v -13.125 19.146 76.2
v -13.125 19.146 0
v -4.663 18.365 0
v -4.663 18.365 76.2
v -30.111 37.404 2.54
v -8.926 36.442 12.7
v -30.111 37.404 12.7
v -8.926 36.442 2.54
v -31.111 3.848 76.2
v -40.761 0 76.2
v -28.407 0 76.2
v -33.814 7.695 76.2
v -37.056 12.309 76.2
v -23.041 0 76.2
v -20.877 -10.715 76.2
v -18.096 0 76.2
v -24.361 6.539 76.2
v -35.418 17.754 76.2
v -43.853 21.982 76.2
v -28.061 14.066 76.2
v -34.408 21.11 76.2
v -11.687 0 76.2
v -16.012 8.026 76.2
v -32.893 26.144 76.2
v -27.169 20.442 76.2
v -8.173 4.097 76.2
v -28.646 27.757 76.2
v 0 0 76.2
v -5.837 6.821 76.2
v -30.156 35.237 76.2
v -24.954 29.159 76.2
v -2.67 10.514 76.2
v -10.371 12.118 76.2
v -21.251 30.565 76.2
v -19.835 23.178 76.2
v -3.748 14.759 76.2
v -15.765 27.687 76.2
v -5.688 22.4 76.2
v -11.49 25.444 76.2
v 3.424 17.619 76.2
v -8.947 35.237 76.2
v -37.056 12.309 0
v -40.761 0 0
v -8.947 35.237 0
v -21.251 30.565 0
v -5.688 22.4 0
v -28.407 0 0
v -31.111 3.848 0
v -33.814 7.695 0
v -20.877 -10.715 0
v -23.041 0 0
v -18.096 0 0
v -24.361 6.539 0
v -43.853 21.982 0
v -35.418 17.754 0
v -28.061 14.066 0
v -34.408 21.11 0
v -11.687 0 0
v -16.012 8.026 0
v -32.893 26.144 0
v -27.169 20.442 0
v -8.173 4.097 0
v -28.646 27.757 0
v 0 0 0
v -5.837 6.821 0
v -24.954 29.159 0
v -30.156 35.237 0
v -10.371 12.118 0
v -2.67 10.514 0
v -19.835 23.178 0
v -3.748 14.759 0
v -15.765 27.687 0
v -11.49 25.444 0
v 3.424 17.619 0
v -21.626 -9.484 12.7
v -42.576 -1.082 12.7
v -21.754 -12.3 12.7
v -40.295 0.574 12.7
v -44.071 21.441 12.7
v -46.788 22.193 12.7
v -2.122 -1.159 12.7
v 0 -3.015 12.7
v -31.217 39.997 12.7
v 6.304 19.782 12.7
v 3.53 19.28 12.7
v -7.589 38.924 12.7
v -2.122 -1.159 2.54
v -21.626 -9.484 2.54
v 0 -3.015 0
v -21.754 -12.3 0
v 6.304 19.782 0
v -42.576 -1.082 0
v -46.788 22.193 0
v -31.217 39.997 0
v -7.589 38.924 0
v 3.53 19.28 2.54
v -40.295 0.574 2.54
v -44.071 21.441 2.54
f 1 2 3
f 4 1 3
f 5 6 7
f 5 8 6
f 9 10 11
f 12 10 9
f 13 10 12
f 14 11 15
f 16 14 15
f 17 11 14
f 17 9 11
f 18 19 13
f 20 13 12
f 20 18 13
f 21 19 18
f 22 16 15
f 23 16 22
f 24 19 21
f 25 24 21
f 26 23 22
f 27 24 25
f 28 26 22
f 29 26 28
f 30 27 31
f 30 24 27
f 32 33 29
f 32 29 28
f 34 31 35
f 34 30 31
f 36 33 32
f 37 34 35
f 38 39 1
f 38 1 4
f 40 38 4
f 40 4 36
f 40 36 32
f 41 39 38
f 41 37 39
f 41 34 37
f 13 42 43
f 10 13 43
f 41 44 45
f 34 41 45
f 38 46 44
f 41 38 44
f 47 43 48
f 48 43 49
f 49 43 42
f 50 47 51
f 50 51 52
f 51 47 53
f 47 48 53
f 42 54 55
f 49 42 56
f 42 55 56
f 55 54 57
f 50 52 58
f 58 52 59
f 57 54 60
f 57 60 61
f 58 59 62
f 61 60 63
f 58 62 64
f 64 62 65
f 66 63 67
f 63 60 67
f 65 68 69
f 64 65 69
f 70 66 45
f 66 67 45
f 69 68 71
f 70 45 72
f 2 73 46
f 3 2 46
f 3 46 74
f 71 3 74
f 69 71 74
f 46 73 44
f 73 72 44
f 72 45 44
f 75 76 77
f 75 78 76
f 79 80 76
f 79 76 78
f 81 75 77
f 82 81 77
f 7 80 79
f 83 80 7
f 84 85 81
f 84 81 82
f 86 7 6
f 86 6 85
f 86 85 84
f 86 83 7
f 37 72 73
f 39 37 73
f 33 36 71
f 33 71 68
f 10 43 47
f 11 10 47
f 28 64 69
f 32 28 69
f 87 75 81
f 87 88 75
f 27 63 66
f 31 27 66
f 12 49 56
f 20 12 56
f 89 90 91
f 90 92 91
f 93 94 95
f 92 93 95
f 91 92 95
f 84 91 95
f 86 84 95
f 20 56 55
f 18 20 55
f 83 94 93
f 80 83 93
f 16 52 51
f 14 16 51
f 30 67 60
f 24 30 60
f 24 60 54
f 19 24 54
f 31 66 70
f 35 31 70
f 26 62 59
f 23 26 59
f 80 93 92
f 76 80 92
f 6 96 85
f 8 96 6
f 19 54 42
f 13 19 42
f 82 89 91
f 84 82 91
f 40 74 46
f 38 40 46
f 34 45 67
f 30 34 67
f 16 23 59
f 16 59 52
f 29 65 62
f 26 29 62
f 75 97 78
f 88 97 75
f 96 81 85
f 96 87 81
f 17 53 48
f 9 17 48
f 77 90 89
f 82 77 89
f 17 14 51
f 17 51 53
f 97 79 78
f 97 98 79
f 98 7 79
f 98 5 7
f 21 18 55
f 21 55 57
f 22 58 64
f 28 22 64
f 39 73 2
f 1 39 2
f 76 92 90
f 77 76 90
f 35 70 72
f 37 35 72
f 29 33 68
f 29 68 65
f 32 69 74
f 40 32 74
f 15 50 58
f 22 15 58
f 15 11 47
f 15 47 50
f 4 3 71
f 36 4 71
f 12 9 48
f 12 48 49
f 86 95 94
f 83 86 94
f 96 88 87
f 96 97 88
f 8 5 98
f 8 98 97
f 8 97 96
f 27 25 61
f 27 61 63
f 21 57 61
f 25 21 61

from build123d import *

# Parameters (mm, degrees)
F1_DEPTH = 12.7
F2_T     = -2.54
F4_DEPTH = 76.2


with BuildPart() as f1:
    # F0 (on Top) → F1 (new body)
    with BuildSketch(Plane.XY):
        Polygon((-21.7536917176, -12.3002491378), (0, -3.0150827952), (6.3037695721, 19.7818447728), (-7.5892500626, 38.9239821348), (-31.2173317532, 39.9969094289), (-46.7880480617, 22.1926905188), (-42.576332023, -1.0817346162), align=None)
    extrude(amount=F1_DEPTH)

    # F2
    f2_openings = [f1.faces().sort_by_distance(p)[0] for p in [
        (-20.517269, 14.928337, 12.7),
    ]]
    offset(amount=F2_T, openings=f2_openings)


with BuildPart() as f4:
    # F3 (on Top) → F4 (new body)
    with BuildSketch(Plane.XY):
        Polygon((-24.9541892799, 29.1589198967), (-30.1561765373, 35.2374315262), (-28.6457198947, 27.7570729649), align=None)
        Polygon((-28.6457198947, 27.7570729649), (-30.1561765373, 35.2374315262), (-32.8926643221, 26.1443094161), align=None)
        Polygon((-21.2510568463, 30.5651725821), (-30.1561765373, 35.2374315262), (-24.9541892799, 29.1589198967), align=None)
        Polygon((-27.168665519, 20.4421351944), (-28.6457198947, 27.7570729649), (-32.8926643221, 26.1443094161), (-34.4076260453, 21.1102171695), align=None)
        Polygon((-15.7645343665, 27.6865527973), (-21.2510568463, 30.5651725821), (-24.9541892799, 29.1589198967), (-19.8353466439, 23.1775625898), align=None)
        Polygon((-8.9474404231, 35.2374315262), (-21.2510568463, 30.5651725821), (-15.7645343665, 27.6865527973), align=None)
        Polygon((-34.4076260453, 21.1102171695), (-32.8926643221, 26.1443094161), (-43.8534840941, 21.981973201), align=None)
        Polygon((-11.4900100358, 25.4438334146), (-8.9474404231, 35.2374315262), (-15.7645343665, 27.6865527973), align=None)
        Polygon((-5.6876512873, 22.3995034673), (-8.9474404231, 35.2374315262), (-11.4900100358, 25.4438334146), align=None)
        Polygon((-35.4177963356, 17.7535050172), (-43.8534840941, 21.981973201), (-37.0562656404, 12.3090073128), align=None)
        Polygon((-34.4076260453, 21.1102171695), (-43.8534840941, 21.981973201), (-35.4177963356, 17.7535050172), align=None)
        Polygon((3.4243194386, 17.6187157631), (-5.6876512873, 22.3995034673), (-4.6632449329, 18.3651151887), align=None)
        Polygon((-4.6632449329, 18.3651151887), (-5.6876512873, 22.3995034673), (-11.4900100358, 25.4438334146), (-13.1250121364, 19.1460497061), align=None)
        Polygon((-35.4177963356, 17.7535050172), (-37.0562656404, 12.3090073128), (-33.8137030162, 7.6945907145), (-28.0614147249, 14.0660492366), align=None)
        Polygon((-33.8137030162, 7.6945907145), (-37.0562656404, 12.3090073128), (-40.7605431974, 0), align=None)
        Polygon((3.4243194386, 17.6187157631), (-4.6632449329, 18.3651151887), (-3.7475663134, 14.7589260294), align=None)
        Polygon((-2.6696306706, 10.513724988), (3.4243194386, 17.6187157631), (-3.7475663134, 14.7589260294), align=None)
        Polygon((-31.1106266284, 3.8479046222), (-33.8137030162, 7.6945907145), (-40.7605431974, 0), align=None)
        Polygon((-31.1106266284, 3.8479046222), (-40.7605431974, 0), (-28.4066939765, 0), align=None)
        Polygon((-23.0409277054, 0), (-24.3613393683, 6.5391831901), (-31.1106266284, 3.8479046222), (-28.4066939765, 0), align=None)
        Polygon((-2.6696306706, 10.513724988), (-3.7475663134, 14.7589260294), (-10.3705782251, 12.1179997618), (-5.8371448342, 6.8206919783), align=None)
        Polygon((0, 0), (-2.6696306706, 10.513724988), (-5.8371448342, 6.8206919783), align=None)
        Polygon((-23.0409277054, 0), (-28.4066939765, 0), (-20.8773575723, -10.7148261741), align=None)
        Polygon((-18.0956228998, 0), (-23.0409277054, 0), (-20.8773575723, -10.7148261741), align=None)
        Polygon((-8.1733023974, 4.0969450427), (-16.0119167724, 8.0261245522), (-18.0956228998, 0), (-11.6872518846, 0), align=None)
        Polygon((-11.6872518846, 0), (0, 0), (-8.1733023974, 4.0969450427), align=None)
        Polygon((-8.1733023974, 4.0969450427), (0, 0), (-5.8371448342, 6.8206919783), align=None)
        Polygon((-18.0956228998, 0), (-20.8773575723, -10.7148261741), (-11.6872518846, 0), align=None)
    extrude(amount=F4_DEPTH)


solid = Compound([f1.part, f4.part])
